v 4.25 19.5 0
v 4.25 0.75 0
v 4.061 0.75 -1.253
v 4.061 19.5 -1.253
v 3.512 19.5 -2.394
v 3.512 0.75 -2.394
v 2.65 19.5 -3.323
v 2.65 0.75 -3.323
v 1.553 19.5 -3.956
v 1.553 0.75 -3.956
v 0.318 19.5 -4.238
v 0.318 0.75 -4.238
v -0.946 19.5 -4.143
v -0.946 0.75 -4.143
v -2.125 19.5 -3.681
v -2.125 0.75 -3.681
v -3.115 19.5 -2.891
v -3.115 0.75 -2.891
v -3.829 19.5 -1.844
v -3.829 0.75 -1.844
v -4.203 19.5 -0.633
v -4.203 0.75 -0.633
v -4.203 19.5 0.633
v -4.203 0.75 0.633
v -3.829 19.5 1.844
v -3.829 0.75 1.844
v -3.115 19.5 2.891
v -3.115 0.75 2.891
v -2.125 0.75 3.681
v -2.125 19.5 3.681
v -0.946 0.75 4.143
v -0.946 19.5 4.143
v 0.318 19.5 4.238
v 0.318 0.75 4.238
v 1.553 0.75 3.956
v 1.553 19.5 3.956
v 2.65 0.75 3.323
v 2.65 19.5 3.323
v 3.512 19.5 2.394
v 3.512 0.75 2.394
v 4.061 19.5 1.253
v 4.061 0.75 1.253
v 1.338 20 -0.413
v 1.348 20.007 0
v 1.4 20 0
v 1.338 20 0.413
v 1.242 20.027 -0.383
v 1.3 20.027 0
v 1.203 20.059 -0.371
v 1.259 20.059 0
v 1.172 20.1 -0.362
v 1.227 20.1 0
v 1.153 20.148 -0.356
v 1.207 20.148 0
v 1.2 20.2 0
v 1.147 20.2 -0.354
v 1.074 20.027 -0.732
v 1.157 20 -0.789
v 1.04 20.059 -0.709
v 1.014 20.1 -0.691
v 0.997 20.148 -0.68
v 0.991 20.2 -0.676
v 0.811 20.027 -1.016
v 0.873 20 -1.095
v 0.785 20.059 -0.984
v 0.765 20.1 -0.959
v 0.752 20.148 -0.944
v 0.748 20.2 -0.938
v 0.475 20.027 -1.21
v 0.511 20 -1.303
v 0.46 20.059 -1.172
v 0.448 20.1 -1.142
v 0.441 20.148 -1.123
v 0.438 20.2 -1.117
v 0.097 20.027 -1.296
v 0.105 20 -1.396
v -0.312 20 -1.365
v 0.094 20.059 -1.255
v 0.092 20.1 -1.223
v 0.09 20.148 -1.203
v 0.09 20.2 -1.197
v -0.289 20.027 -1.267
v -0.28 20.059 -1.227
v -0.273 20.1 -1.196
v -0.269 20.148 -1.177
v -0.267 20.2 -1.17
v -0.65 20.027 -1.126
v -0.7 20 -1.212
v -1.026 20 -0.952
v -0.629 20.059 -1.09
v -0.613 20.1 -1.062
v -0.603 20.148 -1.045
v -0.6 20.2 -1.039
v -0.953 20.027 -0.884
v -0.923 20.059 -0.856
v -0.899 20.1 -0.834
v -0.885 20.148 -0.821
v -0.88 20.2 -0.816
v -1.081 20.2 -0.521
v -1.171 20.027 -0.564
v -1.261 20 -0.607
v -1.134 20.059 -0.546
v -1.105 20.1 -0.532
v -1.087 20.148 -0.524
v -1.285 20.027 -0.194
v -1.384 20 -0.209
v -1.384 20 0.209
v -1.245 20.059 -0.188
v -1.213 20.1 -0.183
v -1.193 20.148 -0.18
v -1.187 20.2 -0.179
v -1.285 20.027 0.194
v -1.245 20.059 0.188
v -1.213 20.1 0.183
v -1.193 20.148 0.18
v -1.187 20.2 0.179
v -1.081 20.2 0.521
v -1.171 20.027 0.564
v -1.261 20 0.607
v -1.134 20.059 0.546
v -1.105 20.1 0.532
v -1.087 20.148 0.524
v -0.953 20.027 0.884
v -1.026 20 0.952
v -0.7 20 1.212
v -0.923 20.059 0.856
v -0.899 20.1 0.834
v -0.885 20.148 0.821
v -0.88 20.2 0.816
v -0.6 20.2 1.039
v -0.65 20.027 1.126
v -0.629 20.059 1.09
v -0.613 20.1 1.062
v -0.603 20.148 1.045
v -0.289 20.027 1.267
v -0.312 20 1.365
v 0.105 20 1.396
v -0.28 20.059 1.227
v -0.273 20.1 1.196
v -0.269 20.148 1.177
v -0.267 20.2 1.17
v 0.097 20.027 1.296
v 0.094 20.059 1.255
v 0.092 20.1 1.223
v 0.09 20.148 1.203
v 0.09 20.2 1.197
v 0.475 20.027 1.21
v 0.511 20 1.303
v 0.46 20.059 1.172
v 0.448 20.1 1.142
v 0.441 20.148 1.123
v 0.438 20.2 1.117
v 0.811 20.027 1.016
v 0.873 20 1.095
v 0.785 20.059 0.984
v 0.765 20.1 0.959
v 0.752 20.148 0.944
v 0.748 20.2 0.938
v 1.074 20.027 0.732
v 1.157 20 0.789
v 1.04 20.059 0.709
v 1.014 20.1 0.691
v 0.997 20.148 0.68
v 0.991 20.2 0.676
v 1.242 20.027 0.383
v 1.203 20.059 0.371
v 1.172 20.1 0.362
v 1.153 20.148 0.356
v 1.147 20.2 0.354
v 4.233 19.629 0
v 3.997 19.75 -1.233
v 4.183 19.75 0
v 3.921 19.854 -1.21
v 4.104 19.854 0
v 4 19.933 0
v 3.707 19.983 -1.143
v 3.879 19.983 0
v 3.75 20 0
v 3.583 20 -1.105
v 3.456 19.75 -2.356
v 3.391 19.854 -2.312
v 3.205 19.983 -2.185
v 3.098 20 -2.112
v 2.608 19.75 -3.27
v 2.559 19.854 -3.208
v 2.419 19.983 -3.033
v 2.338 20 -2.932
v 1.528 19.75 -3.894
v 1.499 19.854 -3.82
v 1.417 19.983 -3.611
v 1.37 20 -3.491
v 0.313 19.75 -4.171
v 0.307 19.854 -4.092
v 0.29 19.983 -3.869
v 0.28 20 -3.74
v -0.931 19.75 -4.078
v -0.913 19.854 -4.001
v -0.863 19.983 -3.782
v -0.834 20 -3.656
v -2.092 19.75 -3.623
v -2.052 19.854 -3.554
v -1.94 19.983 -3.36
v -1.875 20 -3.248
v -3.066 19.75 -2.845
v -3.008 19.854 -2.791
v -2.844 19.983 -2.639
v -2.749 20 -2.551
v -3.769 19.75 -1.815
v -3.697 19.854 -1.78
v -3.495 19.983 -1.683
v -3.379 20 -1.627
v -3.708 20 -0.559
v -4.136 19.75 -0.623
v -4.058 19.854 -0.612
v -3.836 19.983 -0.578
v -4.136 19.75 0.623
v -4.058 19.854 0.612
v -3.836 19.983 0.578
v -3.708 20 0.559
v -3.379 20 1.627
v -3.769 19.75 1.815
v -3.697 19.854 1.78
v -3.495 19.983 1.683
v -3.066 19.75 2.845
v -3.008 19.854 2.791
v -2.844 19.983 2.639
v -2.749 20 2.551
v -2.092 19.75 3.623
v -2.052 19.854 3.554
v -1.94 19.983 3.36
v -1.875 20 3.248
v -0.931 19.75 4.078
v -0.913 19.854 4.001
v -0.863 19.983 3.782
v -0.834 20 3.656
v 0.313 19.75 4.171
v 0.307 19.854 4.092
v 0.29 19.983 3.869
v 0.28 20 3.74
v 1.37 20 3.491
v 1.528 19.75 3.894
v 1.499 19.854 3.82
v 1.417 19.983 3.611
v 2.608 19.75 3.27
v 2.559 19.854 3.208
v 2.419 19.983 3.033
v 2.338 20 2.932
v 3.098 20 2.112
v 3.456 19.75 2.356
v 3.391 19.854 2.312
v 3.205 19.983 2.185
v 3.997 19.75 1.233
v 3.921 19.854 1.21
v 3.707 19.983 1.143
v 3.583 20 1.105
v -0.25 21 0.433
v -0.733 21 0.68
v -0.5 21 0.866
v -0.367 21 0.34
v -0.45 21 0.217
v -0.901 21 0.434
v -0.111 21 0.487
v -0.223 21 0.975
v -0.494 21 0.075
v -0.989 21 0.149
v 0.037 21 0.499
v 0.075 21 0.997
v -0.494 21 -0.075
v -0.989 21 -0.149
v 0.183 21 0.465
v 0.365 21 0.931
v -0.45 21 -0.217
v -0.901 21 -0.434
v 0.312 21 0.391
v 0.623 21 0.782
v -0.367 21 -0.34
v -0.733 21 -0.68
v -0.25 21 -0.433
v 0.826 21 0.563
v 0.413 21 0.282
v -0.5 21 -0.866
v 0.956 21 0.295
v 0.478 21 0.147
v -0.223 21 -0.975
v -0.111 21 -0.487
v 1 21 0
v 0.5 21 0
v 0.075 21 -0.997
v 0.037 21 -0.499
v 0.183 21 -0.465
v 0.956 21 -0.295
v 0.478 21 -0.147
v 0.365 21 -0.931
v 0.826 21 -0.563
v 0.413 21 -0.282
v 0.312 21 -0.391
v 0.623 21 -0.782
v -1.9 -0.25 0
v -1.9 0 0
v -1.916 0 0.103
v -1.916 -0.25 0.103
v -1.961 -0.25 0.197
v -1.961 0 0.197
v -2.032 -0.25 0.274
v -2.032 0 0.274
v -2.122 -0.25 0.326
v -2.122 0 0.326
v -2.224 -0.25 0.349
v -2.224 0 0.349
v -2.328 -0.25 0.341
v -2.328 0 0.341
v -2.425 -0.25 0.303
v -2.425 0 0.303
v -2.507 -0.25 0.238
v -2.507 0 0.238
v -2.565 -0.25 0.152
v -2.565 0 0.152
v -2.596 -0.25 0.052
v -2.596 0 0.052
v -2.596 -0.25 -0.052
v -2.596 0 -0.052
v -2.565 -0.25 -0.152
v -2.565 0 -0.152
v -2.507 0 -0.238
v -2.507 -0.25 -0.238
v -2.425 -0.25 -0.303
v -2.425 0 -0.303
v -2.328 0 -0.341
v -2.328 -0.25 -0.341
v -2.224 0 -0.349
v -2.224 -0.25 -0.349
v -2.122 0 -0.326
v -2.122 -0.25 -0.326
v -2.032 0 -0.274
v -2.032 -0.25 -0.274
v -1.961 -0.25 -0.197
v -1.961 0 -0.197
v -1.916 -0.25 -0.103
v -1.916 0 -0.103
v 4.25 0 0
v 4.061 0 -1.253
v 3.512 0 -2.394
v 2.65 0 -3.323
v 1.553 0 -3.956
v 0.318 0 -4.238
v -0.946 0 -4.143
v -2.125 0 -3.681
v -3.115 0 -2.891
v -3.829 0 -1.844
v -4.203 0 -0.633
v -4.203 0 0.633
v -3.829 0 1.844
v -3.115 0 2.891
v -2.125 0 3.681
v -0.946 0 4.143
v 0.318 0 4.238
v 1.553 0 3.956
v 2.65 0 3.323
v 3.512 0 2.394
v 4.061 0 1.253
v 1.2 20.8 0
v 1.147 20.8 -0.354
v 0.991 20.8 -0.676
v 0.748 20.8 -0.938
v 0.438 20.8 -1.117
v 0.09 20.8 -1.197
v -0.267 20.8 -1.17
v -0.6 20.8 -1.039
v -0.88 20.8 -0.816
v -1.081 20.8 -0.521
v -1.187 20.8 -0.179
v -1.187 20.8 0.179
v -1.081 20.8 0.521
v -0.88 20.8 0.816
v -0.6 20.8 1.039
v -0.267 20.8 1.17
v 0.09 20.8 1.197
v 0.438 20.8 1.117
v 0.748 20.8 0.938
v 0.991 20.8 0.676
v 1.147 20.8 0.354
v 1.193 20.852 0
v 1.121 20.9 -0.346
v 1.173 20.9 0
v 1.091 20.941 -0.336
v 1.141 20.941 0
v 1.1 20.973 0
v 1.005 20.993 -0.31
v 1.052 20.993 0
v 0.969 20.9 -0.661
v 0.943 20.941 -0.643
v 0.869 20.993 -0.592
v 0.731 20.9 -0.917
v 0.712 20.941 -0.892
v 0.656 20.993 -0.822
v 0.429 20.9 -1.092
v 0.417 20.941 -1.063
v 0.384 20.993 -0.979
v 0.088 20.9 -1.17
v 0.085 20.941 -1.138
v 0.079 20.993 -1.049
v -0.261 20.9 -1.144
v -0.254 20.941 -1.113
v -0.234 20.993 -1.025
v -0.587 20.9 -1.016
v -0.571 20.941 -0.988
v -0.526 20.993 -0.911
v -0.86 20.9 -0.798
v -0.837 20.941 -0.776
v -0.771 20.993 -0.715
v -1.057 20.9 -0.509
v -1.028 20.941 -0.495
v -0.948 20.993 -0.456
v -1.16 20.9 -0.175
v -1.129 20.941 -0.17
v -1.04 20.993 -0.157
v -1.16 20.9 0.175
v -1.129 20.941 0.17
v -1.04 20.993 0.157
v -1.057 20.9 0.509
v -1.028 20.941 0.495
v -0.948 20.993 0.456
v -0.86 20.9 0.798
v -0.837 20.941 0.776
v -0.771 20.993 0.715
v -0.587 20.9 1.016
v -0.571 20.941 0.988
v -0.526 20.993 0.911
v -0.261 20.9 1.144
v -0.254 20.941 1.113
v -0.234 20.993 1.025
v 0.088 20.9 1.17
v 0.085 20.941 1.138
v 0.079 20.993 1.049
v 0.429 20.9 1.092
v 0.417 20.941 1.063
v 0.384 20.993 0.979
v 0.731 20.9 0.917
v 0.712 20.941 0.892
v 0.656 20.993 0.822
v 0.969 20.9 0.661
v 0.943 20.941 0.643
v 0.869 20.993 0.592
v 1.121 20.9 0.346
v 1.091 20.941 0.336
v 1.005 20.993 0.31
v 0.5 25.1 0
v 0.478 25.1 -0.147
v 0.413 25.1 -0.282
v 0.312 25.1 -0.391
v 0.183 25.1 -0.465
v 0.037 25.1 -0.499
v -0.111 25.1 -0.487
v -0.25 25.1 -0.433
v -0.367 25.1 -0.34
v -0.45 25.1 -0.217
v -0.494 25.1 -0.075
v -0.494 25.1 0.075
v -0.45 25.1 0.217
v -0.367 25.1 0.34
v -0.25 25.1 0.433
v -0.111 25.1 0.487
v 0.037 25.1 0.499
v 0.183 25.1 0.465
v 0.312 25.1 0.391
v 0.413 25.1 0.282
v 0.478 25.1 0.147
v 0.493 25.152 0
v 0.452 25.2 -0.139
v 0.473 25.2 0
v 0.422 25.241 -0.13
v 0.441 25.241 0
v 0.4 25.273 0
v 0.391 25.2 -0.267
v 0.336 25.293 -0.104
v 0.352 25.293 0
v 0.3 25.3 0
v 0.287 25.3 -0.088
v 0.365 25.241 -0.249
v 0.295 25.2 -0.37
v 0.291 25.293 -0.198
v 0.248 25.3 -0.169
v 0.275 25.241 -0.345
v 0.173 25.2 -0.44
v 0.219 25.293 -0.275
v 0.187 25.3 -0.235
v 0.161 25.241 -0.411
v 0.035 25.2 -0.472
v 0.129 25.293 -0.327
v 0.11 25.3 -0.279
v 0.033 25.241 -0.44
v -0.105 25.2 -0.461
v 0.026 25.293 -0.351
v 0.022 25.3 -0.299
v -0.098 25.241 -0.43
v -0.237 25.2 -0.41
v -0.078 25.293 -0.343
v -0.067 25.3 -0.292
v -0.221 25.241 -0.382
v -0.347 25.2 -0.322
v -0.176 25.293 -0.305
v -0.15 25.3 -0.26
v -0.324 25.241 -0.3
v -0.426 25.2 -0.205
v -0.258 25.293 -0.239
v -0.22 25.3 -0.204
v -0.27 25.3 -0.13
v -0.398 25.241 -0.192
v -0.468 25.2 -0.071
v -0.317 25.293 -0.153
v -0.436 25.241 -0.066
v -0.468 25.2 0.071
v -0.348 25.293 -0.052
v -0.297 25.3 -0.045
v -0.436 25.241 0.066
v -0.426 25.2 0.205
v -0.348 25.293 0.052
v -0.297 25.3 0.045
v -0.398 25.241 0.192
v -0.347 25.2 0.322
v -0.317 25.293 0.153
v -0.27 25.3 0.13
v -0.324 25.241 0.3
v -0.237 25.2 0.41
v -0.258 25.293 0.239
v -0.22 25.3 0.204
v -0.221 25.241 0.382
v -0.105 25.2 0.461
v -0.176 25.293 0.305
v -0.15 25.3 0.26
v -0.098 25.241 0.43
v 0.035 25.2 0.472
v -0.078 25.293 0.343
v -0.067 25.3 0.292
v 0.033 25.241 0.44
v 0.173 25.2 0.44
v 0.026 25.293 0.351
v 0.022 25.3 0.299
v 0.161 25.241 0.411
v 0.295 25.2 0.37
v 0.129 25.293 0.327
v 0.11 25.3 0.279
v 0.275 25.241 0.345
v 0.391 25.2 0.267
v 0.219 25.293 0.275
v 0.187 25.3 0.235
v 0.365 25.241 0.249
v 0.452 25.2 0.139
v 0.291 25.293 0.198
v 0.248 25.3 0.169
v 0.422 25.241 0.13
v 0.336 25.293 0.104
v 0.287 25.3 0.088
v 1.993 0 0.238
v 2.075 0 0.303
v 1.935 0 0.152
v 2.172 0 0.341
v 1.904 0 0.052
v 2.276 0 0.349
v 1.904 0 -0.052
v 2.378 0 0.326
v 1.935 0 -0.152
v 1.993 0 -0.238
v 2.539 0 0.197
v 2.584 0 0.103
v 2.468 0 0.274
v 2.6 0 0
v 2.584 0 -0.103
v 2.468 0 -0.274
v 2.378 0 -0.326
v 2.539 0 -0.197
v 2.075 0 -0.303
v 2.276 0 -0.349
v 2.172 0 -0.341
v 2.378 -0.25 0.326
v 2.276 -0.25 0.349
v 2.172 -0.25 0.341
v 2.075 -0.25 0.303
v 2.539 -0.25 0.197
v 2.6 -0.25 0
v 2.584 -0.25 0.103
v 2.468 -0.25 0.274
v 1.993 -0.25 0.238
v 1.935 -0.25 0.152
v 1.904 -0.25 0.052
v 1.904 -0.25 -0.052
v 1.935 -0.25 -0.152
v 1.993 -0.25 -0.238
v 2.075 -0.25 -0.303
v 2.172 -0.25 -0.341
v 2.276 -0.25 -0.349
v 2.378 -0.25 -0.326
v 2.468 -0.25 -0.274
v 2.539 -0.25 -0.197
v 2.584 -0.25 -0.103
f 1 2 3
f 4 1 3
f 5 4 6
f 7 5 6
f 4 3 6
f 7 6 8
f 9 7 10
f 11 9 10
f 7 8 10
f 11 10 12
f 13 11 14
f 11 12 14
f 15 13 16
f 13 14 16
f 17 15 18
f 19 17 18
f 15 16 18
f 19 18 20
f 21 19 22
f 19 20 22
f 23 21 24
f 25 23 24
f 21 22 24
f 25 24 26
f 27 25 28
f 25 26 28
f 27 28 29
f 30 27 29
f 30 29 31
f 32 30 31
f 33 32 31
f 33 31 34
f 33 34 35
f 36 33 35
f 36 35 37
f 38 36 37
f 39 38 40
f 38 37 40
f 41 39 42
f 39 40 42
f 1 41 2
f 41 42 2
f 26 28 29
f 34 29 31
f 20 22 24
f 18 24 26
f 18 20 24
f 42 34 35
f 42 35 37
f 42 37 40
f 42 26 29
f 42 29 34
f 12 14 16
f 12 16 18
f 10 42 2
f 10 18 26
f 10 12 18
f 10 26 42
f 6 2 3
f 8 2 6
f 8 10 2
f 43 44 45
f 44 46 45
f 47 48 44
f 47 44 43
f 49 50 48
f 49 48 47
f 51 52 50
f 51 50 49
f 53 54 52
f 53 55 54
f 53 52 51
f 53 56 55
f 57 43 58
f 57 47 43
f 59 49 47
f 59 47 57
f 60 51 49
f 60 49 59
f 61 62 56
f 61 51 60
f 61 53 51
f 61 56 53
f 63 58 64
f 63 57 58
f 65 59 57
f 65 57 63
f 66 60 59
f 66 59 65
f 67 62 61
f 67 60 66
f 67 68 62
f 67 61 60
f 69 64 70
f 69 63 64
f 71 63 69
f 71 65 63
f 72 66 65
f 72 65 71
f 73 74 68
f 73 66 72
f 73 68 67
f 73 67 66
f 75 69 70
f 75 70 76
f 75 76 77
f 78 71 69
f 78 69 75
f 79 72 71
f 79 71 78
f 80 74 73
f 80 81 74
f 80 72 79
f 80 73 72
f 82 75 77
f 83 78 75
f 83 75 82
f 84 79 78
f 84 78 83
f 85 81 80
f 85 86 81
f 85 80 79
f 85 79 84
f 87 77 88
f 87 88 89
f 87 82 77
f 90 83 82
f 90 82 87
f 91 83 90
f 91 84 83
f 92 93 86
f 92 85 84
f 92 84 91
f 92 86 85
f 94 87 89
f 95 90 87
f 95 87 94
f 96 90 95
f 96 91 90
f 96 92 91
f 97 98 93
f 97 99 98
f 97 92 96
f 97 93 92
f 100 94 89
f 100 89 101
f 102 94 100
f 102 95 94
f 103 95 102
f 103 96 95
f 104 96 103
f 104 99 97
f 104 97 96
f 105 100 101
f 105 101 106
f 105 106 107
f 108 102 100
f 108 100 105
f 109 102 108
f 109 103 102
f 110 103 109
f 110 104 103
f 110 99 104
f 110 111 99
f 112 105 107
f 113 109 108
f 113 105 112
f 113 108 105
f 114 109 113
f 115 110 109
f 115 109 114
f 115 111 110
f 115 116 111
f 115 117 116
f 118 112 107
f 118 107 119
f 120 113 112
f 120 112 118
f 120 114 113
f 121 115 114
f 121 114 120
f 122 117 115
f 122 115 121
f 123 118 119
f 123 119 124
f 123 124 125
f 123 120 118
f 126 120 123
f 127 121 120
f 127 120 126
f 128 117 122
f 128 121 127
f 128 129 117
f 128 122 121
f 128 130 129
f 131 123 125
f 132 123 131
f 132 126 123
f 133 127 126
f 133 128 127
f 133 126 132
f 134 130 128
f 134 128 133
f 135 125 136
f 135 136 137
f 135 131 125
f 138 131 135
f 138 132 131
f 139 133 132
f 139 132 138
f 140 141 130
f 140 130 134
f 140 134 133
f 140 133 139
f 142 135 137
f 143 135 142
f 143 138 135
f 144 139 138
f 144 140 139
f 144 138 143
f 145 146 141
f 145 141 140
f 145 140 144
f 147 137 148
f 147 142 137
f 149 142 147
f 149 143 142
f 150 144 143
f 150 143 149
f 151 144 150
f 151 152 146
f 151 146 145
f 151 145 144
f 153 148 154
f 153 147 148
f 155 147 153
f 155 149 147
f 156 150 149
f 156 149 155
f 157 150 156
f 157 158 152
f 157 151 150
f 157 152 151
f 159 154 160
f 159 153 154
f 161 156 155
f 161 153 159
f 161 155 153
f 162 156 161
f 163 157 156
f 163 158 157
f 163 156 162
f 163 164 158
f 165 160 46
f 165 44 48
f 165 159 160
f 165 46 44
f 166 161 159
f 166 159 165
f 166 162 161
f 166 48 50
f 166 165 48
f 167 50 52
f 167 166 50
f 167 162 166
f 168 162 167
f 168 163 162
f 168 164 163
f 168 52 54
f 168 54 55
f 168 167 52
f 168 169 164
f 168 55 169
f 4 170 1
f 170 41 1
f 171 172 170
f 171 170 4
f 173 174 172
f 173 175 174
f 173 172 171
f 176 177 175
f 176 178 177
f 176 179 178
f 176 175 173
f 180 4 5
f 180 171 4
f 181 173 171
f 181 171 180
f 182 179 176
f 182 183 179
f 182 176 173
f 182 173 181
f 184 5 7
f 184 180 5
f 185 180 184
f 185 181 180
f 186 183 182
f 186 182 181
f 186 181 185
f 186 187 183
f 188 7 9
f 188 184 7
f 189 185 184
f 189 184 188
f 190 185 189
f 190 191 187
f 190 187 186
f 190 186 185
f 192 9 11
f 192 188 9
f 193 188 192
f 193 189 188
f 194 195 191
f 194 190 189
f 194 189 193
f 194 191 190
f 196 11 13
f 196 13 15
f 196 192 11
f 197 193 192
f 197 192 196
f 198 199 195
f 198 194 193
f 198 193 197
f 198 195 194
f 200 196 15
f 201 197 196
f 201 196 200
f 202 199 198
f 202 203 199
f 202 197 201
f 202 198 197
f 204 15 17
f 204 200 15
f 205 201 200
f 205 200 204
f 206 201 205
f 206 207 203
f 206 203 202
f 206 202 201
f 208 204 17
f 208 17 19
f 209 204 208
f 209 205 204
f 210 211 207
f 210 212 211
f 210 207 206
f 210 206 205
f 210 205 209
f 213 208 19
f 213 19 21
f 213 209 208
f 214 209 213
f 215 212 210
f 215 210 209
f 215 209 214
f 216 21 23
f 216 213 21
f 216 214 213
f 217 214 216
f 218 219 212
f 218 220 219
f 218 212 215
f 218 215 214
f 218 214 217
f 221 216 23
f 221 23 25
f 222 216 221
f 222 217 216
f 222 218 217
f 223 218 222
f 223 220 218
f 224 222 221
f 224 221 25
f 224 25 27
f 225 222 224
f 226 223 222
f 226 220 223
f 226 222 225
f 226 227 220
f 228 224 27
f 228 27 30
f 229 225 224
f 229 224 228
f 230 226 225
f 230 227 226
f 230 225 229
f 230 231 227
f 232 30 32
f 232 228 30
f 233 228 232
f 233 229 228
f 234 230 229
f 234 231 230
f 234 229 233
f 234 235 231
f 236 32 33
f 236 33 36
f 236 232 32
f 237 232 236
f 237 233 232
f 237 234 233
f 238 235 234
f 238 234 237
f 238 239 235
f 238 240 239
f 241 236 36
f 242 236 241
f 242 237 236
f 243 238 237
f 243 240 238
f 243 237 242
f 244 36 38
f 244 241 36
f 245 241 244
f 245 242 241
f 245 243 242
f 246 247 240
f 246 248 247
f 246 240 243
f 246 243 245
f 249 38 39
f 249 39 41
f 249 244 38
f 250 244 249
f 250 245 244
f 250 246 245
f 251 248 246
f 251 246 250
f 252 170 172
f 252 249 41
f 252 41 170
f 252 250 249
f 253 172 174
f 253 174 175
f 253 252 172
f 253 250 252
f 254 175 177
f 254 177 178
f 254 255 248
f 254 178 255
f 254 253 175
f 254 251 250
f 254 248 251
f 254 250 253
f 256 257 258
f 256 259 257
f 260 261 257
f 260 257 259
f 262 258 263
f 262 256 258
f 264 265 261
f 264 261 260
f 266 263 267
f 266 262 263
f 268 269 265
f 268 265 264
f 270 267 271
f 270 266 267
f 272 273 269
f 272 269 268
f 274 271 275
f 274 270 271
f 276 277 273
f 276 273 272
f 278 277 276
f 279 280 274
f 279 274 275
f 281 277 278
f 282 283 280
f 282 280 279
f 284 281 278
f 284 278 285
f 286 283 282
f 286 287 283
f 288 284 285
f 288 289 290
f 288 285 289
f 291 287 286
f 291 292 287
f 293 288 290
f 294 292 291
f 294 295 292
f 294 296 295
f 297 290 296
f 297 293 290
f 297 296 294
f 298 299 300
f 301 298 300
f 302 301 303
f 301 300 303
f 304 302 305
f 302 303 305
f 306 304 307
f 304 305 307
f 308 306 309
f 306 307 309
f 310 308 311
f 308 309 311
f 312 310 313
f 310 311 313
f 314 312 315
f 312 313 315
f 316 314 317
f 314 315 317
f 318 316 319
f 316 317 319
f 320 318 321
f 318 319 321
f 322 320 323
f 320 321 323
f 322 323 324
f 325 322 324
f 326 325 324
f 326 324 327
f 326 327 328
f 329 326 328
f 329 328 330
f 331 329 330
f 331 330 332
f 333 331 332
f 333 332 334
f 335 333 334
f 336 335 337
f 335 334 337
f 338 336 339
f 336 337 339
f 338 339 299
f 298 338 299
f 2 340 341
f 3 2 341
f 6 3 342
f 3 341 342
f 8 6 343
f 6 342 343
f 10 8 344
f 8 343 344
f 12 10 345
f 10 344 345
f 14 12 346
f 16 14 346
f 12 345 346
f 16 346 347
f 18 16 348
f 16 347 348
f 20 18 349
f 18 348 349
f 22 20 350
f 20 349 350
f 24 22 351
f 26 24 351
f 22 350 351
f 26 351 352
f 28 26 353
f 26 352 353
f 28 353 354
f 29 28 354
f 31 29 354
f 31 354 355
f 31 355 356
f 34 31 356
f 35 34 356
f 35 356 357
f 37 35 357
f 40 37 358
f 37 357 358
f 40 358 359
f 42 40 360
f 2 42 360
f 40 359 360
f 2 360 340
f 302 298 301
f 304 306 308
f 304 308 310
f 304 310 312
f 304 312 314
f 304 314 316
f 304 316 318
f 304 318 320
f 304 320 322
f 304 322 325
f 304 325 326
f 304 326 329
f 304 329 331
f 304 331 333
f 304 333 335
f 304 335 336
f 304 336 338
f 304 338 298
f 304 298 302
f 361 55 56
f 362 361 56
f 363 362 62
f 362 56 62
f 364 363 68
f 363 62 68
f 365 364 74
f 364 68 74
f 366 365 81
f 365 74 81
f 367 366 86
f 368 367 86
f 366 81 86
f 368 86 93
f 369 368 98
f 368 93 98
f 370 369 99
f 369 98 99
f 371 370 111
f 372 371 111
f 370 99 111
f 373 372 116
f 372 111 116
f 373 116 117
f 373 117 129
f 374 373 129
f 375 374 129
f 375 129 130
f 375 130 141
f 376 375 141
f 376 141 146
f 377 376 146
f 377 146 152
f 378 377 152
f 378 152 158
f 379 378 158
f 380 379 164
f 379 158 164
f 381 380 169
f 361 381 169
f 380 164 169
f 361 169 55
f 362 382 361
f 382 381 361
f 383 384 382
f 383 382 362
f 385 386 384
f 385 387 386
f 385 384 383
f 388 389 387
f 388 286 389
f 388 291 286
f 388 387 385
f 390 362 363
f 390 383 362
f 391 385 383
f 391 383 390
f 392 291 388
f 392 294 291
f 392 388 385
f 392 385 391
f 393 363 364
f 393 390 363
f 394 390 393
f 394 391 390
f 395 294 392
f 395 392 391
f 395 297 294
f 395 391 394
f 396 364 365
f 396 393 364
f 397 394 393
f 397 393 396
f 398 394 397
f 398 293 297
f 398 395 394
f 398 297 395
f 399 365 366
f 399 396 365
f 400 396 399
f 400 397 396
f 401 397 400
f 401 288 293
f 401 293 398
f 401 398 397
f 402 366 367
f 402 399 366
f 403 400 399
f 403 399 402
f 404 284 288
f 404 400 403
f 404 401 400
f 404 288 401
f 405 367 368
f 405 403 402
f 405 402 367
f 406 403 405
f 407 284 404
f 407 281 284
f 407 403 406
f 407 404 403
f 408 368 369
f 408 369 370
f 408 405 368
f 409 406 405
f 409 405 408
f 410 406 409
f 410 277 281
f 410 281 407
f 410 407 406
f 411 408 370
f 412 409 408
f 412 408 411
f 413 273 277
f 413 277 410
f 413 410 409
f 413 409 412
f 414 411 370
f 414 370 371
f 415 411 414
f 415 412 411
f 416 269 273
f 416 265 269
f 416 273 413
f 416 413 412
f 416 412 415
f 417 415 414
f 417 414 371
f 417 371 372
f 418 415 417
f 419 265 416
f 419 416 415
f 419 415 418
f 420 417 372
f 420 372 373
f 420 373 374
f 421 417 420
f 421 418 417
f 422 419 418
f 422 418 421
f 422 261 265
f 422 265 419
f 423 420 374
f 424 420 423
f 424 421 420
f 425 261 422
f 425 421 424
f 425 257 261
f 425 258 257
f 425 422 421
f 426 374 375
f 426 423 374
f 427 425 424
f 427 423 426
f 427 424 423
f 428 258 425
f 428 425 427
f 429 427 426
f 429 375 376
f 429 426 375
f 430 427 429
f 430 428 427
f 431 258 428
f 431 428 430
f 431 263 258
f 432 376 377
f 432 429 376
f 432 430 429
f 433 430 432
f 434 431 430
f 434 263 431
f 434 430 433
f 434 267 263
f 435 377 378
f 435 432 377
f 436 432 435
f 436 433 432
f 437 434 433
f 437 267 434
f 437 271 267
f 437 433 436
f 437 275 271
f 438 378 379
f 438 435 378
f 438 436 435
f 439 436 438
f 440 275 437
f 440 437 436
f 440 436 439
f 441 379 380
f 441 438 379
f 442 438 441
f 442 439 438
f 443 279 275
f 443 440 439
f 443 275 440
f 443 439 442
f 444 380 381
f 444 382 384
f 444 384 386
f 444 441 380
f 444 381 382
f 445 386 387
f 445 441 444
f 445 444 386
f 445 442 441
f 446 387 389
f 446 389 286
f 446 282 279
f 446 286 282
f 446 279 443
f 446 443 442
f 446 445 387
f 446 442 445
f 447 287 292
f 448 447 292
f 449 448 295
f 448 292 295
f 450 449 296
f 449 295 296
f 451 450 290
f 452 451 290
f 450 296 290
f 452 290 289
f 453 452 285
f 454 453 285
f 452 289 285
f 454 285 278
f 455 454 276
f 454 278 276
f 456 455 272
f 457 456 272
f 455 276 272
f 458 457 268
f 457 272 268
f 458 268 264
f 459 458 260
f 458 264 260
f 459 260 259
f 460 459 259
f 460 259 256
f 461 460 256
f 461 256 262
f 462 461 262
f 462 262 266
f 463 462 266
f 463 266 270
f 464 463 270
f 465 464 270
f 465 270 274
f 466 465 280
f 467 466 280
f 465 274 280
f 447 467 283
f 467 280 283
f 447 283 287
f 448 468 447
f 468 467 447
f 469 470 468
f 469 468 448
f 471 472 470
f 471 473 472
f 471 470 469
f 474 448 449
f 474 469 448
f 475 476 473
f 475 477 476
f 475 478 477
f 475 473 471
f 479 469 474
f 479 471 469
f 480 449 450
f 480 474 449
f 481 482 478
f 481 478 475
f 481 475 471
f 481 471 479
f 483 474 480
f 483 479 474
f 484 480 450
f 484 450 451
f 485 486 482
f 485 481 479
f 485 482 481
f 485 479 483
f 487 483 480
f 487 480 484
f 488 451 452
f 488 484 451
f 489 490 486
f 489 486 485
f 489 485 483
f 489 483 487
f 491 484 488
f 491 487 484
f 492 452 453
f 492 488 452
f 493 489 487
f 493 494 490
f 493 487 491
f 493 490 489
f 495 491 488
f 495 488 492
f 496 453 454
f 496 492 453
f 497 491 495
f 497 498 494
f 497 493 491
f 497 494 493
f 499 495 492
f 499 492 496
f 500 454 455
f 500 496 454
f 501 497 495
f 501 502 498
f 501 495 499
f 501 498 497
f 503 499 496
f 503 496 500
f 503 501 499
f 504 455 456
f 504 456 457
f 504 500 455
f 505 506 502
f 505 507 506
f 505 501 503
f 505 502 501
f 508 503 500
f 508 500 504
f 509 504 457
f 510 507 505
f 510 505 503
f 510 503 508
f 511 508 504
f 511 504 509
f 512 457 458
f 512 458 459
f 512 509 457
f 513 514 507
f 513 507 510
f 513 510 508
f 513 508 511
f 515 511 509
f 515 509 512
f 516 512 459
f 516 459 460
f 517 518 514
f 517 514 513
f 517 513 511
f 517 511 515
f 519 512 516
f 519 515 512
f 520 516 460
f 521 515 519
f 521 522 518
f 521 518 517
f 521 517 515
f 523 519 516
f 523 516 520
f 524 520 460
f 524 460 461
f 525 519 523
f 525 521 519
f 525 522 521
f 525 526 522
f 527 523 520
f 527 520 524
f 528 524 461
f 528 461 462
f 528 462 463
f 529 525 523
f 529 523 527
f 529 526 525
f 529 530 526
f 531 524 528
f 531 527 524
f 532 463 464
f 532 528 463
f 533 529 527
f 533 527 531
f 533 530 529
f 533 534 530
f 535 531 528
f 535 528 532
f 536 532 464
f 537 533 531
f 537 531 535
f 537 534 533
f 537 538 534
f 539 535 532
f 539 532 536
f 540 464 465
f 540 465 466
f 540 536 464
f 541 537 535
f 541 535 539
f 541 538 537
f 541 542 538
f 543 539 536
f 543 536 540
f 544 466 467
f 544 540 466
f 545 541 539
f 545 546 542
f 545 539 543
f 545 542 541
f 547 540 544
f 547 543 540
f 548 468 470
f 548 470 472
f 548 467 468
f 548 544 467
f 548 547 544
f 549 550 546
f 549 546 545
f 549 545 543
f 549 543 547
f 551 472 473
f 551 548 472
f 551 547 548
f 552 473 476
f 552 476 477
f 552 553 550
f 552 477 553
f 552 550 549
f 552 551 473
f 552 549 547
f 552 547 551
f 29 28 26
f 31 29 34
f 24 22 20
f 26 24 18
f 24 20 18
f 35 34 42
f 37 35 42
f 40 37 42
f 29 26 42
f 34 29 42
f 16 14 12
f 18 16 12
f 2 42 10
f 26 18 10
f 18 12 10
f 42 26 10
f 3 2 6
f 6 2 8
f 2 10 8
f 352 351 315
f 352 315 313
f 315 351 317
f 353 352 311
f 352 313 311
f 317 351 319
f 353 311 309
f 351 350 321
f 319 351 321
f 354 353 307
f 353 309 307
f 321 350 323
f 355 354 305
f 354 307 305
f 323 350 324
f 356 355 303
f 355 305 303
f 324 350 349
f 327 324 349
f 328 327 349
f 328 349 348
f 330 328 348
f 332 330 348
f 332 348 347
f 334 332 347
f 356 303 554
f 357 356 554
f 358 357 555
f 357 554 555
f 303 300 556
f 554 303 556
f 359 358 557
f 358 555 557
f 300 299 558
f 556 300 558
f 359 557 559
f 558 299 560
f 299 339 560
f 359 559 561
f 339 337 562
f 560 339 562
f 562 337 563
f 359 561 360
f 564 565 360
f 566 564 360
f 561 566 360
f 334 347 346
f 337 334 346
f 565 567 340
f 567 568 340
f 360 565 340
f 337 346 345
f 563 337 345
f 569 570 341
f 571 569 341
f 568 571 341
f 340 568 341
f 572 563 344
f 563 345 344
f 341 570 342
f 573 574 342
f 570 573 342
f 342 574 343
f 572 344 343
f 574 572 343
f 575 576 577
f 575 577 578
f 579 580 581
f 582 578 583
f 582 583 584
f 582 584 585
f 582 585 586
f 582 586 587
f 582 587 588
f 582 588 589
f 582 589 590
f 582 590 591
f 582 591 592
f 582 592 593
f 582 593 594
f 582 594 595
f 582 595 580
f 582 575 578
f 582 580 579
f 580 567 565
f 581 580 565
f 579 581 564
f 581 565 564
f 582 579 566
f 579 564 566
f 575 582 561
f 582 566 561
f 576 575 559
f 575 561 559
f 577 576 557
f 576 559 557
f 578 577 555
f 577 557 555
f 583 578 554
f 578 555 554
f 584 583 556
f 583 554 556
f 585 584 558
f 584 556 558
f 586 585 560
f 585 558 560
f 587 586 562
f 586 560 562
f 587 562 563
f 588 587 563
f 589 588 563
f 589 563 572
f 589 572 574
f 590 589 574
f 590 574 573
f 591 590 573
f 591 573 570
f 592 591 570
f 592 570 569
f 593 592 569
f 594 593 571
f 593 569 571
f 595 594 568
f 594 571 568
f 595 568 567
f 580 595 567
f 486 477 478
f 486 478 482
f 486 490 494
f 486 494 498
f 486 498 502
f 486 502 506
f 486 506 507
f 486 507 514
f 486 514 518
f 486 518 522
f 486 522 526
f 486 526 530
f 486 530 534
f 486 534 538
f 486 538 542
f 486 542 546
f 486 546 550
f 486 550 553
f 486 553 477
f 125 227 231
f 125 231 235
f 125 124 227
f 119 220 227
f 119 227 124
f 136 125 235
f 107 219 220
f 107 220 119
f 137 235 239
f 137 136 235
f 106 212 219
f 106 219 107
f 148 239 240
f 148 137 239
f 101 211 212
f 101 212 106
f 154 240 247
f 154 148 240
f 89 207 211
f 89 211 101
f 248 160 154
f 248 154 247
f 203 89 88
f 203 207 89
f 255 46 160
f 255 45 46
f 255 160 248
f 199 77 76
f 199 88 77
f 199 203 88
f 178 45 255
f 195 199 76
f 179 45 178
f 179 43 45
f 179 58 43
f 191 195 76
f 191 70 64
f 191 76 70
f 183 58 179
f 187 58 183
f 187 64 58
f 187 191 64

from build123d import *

# Parameters (mm, degrees)
SKETCH1_R           = 4.25
BOSS_EXTRUDE1_DEPTH = 0.75
SKETCH2_R           = 4.25
BOSS_EXTRUDE2_DEPTH = 19.25
SKETCH3_R           = 1.2
BOSS_EXTRUDE3_DEPTH = 1
SKETCH4_R           = 0.5
BOSS_EXTRUDE4_DEPTH = 4.3
FILLET1_R           = 0.5
FILLET2_R           = 0.2
SKETCH5_R           = 0.35
BOSS_EXTRUDE5_DEPTH = 0.25


with BuildPart() as part:
    # Sketch1 → Boss-Extrude1 (new body)
    with BuildSketch(Plane(origin=(0, 0, 0), x_dir=(1, 0, 0), z_dir=(0, 1, 0))):
        Circle(SKETCH1_R)
    extrude(amount=BOSS_EXTRUDE1_DEPTH)

    # Sketch5 → Boss-Extrude5 (add)
    with BuildSketch(Plane.XZ):
        with Locations((-2.25, 0)):
            Circle(SKETCH5_R)
        with Locations((2.25, 0)):
            Circle(SKETCH5_R)
    extrude(amount=BOSS_EXTRUDE5_DEPTH)


with BuildPart() as body_2:
    # Sketch2 → Boss-Extrude2 (new body)
    with BuildSketch(Plane(origin=(0, 0.75, 0), x_dir=(1, 0, 0), z_dir=(0, 1, 0))):
        Circle(SKETCH2_R)
    extrude(amount=BOSS_EXTRUDE2_DEPTH)

    # Sketch3 → Boss-Extrude3 (add)
    with BuildSketch(Plane(origin=(0, 20, 0), x_dir=(1, 0, 0), z_dir=(0, 1, 0))):
        Circle(SKETCH3_R)
    extrude(amount=BOSS_EXTRUDE3_DEPTH)

    # Sketch4 → Boss-Extrude4 (add)
    with BuildSketch(Plane(origin=(0, 21, 0), x_dir=(1, 0, 0), z_dir=(0, 1, 0))):
        Circle(SKETCH4_R)
    extrude(amount=BOSS_EXTRUDE4_DEPTH)

    # Fillet1
    fillet1_edges = [body_2.edges().sort_by_distance(p)[0] for p in [
        (-4.25, 20, 0),
    ]]
    fillet(fillet1_edges, radius=FILLET1_R)

    # Fillet2
    fillet2_edges = [body_2.edges().sort_by_distance(p)[0] for p in [
        (-1.2, 20, 0),
        (-1.2, 21, 0),
        (-0.5, 25.3, 0),
    ]]
    fillet(fillet2_edges, radius=FILLET2_R)


solid = Compound([part.part, body_2.part])
